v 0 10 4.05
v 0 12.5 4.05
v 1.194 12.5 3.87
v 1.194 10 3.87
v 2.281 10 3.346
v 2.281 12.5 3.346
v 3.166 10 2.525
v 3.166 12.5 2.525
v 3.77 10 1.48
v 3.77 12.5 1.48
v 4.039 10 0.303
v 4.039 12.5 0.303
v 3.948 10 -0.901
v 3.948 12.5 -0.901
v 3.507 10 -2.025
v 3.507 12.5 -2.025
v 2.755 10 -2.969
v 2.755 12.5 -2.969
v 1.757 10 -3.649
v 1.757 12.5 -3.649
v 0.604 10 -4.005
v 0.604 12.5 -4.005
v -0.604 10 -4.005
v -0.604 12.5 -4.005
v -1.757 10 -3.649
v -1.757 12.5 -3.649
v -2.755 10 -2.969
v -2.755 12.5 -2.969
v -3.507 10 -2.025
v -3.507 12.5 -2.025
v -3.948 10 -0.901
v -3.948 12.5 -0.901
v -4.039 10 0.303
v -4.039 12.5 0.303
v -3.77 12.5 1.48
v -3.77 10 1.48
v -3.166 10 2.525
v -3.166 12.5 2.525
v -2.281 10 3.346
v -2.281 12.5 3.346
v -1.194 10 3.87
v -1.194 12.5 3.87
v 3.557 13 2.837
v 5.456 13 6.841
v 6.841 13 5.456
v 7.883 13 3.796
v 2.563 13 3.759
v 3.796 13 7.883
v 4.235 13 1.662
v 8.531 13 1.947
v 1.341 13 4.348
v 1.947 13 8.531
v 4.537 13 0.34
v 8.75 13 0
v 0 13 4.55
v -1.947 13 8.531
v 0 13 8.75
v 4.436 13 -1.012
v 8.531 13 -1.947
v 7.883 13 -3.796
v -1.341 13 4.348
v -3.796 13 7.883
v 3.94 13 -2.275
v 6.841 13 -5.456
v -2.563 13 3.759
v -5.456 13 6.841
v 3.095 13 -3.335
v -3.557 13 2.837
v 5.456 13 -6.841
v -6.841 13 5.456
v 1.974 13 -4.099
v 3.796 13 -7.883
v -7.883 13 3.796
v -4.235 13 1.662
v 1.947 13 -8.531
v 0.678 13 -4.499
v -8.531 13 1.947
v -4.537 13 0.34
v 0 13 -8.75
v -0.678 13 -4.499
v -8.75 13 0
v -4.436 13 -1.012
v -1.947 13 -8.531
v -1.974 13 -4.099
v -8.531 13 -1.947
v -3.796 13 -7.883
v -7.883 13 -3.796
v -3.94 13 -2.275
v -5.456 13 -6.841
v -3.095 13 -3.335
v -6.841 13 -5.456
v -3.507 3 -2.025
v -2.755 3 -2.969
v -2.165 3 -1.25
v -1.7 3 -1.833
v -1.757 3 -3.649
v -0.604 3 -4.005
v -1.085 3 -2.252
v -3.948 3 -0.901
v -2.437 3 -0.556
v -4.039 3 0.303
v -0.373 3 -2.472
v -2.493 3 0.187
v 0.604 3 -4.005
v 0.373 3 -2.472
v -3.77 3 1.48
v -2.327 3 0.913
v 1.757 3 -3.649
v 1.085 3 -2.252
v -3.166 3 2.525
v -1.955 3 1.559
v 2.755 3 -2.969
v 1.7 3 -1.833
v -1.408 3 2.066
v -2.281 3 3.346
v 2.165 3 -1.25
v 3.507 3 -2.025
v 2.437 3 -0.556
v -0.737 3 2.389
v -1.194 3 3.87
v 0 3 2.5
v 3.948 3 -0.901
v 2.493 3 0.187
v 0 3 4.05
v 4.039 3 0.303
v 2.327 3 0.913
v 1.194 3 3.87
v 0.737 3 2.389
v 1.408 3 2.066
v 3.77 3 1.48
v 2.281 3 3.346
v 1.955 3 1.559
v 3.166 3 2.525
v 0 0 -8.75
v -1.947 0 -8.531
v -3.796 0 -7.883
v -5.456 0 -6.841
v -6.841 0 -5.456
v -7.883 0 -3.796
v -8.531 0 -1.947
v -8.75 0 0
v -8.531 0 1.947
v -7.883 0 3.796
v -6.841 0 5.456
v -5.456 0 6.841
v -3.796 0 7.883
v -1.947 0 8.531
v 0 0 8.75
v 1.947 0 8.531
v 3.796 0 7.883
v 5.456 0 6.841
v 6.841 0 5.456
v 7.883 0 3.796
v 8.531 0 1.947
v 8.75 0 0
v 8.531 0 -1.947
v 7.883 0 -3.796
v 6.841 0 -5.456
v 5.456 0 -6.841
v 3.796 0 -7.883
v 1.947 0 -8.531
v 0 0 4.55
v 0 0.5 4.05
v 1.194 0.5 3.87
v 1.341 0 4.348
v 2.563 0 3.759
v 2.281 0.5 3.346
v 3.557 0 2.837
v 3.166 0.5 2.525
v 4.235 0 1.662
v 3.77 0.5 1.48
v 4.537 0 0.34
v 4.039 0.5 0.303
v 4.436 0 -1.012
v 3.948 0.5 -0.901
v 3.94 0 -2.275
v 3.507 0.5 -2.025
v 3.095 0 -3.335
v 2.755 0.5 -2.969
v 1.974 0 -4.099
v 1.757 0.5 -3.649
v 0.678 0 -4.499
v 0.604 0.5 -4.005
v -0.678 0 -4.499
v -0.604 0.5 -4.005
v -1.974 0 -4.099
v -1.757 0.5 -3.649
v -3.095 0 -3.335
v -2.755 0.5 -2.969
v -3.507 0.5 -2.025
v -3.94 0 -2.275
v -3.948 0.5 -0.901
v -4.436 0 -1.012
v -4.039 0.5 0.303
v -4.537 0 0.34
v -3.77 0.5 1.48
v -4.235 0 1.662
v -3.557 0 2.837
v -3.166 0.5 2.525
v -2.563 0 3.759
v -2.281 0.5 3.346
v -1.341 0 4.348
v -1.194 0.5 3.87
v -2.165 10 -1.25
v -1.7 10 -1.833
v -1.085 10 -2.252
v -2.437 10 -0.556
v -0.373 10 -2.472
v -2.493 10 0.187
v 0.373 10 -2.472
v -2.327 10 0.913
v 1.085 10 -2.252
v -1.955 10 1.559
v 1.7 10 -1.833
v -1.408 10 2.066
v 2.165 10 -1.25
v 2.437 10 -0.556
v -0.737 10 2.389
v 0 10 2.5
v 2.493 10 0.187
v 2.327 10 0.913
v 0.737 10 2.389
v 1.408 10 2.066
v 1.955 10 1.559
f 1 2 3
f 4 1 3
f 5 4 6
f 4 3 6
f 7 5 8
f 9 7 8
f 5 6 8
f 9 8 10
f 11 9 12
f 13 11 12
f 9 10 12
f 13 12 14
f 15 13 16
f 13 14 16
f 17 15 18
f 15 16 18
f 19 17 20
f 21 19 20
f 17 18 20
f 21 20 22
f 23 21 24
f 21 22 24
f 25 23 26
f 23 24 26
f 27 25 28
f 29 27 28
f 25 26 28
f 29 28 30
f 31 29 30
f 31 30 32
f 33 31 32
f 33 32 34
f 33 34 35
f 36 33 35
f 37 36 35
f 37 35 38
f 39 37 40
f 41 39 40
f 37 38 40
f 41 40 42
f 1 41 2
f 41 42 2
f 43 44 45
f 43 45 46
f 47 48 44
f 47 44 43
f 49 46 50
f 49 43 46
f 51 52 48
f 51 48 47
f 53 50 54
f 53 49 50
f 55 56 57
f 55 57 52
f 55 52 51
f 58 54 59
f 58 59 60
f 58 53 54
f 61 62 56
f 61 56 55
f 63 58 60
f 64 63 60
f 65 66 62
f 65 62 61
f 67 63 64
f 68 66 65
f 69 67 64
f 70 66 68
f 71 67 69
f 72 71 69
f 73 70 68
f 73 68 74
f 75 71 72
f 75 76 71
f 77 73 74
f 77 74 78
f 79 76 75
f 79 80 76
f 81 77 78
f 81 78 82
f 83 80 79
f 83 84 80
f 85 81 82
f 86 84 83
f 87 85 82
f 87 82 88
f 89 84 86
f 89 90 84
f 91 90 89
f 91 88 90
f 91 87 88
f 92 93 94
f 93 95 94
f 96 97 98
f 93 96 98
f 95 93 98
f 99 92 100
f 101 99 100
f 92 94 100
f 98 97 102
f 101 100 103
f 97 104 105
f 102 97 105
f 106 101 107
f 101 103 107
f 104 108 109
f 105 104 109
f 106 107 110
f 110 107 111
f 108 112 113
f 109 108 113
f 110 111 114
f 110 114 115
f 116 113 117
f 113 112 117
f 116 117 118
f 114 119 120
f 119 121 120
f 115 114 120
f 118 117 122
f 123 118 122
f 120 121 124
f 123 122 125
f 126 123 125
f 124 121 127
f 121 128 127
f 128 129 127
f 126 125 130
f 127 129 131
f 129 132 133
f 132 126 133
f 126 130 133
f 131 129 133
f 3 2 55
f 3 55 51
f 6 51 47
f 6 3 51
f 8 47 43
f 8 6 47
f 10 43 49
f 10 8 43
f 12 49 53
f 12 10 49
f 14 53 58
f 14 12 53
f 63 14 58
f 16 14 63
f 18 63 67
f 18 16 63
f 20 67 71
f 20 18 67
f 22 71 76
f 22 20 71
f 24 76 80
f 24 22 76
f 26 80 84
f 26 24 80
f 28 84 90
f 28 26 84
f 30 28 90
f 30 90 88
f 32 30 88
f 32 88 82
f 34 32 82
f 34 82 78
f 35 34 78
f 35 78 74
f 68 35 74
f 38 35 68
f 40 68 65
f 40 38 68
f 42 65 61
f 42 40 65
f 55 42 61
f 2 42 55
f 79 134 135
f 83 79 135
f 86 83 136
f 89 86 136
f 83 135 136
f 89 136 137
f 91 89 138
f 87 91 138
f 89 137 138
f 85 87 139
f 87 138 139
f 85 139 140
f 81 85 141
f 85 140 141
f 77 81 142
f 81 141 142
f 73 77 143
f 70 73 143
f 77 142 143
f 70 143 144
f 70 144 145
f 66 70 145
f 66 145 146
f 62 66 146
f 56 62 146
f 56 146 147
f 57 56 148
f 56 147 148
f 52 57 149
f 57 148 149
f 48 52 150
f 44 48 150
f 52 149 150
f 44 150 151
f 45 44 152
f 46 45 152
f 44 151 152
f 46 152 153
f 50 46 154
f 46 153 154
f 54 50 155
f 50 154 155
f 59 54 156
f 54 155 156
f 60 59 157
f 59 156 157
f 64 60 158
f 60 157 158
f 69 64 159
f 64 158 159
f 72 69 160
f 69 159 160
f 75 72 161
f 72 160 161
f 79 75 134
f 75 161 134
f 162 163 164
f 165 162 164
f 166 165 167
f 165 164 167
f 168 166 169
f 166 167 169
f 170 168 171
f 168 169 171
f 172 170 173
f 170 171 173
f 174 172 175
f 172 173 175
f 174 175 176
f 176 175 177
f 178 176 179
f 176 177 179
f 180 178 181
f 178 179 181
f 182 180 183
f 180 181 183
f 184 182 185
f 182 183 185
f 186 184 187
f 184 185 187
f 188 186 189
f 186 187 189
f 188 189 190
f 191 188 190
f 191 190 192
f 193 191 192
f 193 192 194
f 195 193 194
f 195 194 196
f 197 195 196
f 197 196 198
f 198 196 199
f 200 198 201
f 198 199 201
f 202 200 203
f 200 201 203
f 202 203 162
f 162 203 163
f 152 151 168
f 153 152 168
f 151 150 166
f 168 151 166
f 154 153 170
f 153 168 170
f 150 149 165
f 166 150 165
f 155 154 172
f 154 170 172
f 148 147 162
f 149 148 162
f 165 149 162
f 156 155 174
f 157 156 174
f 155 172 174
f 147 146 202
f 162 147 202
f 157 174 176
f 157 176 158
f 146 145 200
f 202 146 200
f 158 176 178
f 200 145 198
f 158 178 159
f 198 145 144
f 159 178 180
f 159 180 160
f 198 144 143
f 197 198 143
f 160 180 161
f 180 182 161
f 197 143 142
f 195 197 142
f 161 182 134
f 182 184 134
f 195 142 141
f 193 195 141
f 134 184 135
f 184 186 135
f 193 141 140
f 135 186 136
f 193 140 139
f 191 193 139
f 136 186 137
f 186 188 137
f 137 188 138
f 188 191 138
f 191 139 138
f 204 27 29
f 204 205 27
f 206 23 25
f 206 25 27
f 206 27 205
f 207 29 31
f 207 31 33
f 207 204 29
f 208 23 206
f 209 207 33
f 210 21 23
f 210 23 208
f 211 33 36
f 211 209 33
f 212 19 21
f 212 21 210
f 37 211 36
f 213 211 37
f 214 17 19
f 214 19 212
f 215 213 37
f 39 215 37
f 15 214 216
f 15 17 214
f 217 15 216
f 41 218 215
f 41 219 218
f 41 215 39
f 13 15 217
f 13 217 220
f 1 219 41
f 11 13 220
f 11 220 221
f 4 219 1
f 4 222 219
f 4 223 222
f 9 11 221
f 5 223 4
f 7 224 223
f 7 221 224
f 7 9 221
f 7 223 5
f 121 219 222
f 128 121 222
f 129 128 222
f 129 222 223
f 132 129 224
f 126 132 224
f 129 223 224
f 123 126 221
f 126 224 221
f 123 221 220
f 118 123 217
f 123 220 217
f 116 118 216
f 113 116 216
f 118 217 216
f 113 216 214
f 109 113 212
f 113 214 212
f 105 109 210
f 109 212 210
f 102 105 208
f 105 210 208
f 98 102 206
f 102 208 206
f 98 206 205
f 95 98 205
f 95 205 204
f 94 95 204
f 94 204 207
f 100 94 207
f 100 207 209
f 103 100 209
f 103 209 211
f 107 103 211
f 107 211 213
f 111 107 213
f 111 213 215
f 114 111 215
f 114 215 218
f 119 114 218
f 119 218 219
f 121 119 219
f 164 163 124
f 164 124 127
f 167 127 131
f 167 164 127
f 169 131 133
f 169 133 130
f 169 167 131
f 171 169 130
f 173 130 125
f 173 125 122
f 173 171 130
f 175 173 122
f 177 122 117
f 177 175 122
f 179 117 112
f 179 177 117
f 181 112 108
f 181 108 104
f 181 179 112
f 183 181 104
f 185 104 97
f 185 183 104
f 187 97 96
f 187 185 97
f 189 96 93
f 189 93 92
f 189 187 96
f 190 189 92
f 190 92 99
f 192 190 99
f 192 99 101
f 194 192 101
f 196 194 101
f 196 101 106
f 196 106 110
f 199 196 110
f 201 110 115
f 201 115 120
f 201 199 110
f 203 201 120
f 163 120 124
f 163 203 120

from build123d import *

# Parameters (mm, degrees)
SKETCH1_R           = 8.75
BOSS_EXTRUDE1_DEPTH = 13
CUT_EXTRUDE1_REACH  = 19.948
SKETCH2_R           = 2.5
SKETCH3_R           = 4.05
CUT_EXTRUDE2_DEPTH  = 3
CHAMFER1_SIZE       = 0.5


with BuildPart() as part:
    # Sketch1 → Boss-Extrude1 (new body)
    with BuildSketch(Plane(origin=(0, 0, 0), x_dir=(1, 0, 0), z_dir=(0, 1, 0))):
        with Locations(Location((0, 0, 0), (0, 0, 90))):
            Circle(SKETCH1_R)
    extrude(amount=BOSS_EXTRUDE1_DEPTH)

    # Sketch2 → Cut-Extrude1 (cut, up to next)
    with BuildSketch(Plane(origin=(0, 13, 0), x_dir=(1, 0, 0), z_dir=(0, 1, 0)), mode=Mode.PRIVATE) as cut_extrude1_sk1:
        with Locations(Location((0, 0, 0), (0, 0, 270))):
            Circle(SKETCH2_R)
    cut_extrude1_tool1 = extrude(cut_extrude1_sk1.sketch, amount=-CUT_EXTRUDE1_REACH, mode=Mode.PRIVATE) & part.part
    add(cut_extrude1_tool1.solids().sort_by_distance((0, 13, 0))[0], mode=Mode.SUBTRACT)

    # Sketch3 → Cut-Extrude2 (cut)
    with BuildSketch(Plane(origin=(0, 13, 0), x_dir=(1, 0, 0), z_dir=(0, 1, 0))):
        with Locations(Location((0, 0, 0), (0, 0, 270))):
            Circle(SKETCH3_R)
    cut_extrude2 = extrude(amount=-CUT_EXTRUDE2_DEPTH, mode=Mode.SUBTRACT)

    # Mirror3: Cut-Extrude2 across plane
    add(cut_extrude2.mirror(Plane.ZX.offset(6.5)), mode=Mode.SUBTRACT)

    # Chamfer1
    chamfer1_edges = [part.edges().sort_by_distance(p)[0] for p in [
        (0, 13, -4.05),
        (0, 0, -4.05),
    ]]
    chamfer(chamfer1_edges, length=CHAMFER1_SIZE)


solid = part.part
